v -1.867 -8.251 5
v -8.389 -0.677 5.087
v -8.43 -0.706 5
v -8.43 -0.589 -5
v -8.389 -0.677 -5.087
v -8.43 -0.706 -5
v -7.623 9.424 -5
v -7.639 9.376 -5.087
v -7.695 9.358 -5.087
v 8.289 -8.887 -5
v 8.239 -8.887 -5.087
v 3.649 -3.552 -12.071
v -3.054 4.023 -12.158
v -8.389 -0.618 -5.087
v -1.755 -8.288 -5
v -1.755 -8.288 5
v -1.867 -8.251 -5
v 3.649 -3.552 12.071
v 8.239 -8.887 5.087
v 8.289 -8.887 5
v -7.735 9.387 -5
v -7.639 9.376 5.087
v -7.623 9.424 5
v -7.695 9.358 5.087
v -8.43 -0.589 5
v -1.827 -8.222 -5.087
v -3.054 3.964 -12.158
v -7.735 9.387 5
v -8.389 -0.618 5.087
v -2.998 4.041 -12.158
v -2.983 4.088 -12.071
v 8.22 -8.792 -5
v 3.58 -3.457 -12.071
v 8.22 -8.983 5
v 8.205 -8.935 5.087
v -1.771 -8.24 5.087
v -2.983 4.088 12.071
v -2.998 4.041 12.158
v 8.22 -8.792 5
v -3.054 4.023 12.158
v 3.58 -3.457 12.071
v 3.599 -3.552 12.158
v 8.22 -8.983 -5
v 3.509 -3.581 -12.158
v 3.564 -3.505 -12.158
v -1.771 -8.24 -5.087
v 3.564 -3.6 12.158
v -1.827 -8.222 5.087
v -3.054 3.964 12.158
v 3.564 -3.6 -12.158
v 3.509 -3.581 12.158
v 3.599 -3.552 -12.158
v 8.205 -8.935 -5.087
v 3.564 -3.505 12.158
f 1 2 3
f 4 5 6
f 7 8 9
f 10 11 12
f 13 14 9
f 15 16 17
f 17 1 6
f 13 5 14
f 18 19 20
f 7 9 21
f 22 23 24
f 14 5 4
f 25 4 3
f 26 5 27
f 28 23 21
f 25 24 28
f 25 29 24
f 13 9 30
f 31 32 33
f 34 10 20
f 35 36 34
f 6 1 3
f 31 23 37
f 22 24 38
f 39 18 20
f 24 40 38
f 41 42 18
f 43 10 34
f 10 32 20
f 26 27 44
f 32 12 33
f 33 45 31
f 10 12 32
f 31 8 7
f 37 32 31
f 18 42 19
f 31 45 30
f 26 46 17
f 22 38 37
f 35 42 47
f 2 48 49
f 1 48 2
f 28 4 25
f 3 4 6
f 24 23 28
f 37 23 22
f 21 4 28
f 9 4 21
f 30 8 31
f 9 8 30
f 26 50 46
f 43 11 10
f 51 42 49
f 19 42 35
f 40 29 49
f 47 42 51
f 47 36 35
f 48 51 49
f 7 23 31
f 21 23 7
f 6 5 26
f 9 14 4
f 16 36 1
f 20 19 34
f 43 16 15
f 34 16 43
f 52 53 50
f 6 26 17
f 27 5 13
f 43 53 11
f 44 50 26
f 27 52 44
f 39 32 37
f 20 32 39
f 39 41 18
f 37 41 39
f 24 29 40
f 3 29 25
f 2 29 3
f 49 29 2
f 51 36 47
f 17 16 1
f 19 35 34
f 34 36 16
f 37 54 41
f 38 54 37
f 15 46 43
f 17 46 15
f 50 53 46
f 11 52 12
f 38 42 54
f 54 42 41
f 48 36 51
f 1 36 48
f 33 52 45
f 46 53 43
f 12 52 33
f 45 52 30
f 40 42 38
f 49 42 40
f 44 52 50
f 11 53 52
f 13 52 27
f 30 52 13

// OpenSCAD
// Auto-generated OpenSCAD file

    inner_points = 10*[[0.3549004973467511, -0.35521054808402747, -1.2071067811864837], [-0.30136407955047917, 0.39932030291538634, -1.2071067811866112], [0.3549004973463955, -0.3552105480839295, 1.2071067811866112], [-0.3013640795508348, 0.3993203029154843, 1.2071067811864837], [0.818949629923199, -0.8887444294401406, -0.4999999999998463], [-0.7654132121271353, 0.9328541842715569, -0.5000000000001537], [0.8189496299230516, -0.8887444294401, 0.5000000000001537], [-0.7654132121272826, 0.9328541842715975, 0.4999999999998463], [-0.178633384009495, -0.8192596806605508, -0.4999999999999961], [-0.8348979609067254, -0.06472882966113712, -0.5000000000001235], [-0.17863338400964232, -0.8192596806605101, 0.5000000000000039], [-0.8348979609068726, -0.06472882966109651, 0.49999999999987654]];

    outer_points = 10*[[1.2307668032340542, 0.4303553059775063, 0.08434552661867156], [1.0919099787017486, -0.4303553059775063, 0.574137344382946], [-1.0919099787017486, 0.4303553059775063, -0.574137344382946], [-1.2307668032340542, -0.4303553059775063, -0.08434552661867156], [0.6486571265504295, 1.0389696163301188, -0.4548547567133196], [0.3134270975364759, -1.0389696163301188, 0.7276072924725627], [-0.3134270975364759, 1.0389696163301188, -0.7276072924725627], [-0.6486571265504295, -1.0389696163301188, 0.4548547567133196], [0.3844694278615675, 0.7903395017889528, 0.47701858554126475], [0.24561260332926171, -0.07037111016605979, 0.9668104033055391], [-0.577614796225338, 0.7903395017889528, 0.20426604978202156], [-0.7164716207576437, -0.07037111016605979, 0.6940578675462961]];

    // Convex hull for inner set (I)
    module inner_hull() {
        hull() {
            for (p = inner_points) {
                translate(p) sphere(r=0.1);
            }
        }
    }

    // Convex hull for outer set (O) minus inner hull (O \ I)
    module outer_minus_inner() {
        difference() {
            hull() {
                for (p = outer_points) {
                    translate(p) sphere(r=0.1);
                }
            }
            inner_hull(); // Subtract inner hull
        }
    }

    // Convex hull for outer set (O) minus all translated inner hulls
    module outer_minus_AllTranslationInner() {
        difference() {
            hull() {
                for (p = outer_points) {
                    translate(p) sphere(r=0.1);
                }
            }
            hull() {
                translate([0,0,50]) inner_hull();
                translate([0,0,-50]) inner_hull();
            }; // Subtract translated inner hulls
        }
    }

    // Difference between outer_minus_inner and outer_minus_AllTranslationInner
    module outer_minus_inner_diff() {
        difference() {
            // Outer minus inner
            difference() {
                hull() {
                    for (p = outer_points) {
                        translate(p) sphere(r=0.1);
                    }
                }
                inner_hull();
            }

            // Subtract Outer minus AllTranslationInner
            difference() {
                hull() {
                    for (p = outer_points) {
                        translate(p) sphere(r=0.1);
                    }
                }
                hull() {
                    translate([0,0,50]) inner_hull();
                    translate([0,0,-50]) inner_hull();
                };
            }
        }
    }

    // Rendering all with colors applied
    color([1, 0, 0, 0.5]) inner_hull(); // Transparent red
    
